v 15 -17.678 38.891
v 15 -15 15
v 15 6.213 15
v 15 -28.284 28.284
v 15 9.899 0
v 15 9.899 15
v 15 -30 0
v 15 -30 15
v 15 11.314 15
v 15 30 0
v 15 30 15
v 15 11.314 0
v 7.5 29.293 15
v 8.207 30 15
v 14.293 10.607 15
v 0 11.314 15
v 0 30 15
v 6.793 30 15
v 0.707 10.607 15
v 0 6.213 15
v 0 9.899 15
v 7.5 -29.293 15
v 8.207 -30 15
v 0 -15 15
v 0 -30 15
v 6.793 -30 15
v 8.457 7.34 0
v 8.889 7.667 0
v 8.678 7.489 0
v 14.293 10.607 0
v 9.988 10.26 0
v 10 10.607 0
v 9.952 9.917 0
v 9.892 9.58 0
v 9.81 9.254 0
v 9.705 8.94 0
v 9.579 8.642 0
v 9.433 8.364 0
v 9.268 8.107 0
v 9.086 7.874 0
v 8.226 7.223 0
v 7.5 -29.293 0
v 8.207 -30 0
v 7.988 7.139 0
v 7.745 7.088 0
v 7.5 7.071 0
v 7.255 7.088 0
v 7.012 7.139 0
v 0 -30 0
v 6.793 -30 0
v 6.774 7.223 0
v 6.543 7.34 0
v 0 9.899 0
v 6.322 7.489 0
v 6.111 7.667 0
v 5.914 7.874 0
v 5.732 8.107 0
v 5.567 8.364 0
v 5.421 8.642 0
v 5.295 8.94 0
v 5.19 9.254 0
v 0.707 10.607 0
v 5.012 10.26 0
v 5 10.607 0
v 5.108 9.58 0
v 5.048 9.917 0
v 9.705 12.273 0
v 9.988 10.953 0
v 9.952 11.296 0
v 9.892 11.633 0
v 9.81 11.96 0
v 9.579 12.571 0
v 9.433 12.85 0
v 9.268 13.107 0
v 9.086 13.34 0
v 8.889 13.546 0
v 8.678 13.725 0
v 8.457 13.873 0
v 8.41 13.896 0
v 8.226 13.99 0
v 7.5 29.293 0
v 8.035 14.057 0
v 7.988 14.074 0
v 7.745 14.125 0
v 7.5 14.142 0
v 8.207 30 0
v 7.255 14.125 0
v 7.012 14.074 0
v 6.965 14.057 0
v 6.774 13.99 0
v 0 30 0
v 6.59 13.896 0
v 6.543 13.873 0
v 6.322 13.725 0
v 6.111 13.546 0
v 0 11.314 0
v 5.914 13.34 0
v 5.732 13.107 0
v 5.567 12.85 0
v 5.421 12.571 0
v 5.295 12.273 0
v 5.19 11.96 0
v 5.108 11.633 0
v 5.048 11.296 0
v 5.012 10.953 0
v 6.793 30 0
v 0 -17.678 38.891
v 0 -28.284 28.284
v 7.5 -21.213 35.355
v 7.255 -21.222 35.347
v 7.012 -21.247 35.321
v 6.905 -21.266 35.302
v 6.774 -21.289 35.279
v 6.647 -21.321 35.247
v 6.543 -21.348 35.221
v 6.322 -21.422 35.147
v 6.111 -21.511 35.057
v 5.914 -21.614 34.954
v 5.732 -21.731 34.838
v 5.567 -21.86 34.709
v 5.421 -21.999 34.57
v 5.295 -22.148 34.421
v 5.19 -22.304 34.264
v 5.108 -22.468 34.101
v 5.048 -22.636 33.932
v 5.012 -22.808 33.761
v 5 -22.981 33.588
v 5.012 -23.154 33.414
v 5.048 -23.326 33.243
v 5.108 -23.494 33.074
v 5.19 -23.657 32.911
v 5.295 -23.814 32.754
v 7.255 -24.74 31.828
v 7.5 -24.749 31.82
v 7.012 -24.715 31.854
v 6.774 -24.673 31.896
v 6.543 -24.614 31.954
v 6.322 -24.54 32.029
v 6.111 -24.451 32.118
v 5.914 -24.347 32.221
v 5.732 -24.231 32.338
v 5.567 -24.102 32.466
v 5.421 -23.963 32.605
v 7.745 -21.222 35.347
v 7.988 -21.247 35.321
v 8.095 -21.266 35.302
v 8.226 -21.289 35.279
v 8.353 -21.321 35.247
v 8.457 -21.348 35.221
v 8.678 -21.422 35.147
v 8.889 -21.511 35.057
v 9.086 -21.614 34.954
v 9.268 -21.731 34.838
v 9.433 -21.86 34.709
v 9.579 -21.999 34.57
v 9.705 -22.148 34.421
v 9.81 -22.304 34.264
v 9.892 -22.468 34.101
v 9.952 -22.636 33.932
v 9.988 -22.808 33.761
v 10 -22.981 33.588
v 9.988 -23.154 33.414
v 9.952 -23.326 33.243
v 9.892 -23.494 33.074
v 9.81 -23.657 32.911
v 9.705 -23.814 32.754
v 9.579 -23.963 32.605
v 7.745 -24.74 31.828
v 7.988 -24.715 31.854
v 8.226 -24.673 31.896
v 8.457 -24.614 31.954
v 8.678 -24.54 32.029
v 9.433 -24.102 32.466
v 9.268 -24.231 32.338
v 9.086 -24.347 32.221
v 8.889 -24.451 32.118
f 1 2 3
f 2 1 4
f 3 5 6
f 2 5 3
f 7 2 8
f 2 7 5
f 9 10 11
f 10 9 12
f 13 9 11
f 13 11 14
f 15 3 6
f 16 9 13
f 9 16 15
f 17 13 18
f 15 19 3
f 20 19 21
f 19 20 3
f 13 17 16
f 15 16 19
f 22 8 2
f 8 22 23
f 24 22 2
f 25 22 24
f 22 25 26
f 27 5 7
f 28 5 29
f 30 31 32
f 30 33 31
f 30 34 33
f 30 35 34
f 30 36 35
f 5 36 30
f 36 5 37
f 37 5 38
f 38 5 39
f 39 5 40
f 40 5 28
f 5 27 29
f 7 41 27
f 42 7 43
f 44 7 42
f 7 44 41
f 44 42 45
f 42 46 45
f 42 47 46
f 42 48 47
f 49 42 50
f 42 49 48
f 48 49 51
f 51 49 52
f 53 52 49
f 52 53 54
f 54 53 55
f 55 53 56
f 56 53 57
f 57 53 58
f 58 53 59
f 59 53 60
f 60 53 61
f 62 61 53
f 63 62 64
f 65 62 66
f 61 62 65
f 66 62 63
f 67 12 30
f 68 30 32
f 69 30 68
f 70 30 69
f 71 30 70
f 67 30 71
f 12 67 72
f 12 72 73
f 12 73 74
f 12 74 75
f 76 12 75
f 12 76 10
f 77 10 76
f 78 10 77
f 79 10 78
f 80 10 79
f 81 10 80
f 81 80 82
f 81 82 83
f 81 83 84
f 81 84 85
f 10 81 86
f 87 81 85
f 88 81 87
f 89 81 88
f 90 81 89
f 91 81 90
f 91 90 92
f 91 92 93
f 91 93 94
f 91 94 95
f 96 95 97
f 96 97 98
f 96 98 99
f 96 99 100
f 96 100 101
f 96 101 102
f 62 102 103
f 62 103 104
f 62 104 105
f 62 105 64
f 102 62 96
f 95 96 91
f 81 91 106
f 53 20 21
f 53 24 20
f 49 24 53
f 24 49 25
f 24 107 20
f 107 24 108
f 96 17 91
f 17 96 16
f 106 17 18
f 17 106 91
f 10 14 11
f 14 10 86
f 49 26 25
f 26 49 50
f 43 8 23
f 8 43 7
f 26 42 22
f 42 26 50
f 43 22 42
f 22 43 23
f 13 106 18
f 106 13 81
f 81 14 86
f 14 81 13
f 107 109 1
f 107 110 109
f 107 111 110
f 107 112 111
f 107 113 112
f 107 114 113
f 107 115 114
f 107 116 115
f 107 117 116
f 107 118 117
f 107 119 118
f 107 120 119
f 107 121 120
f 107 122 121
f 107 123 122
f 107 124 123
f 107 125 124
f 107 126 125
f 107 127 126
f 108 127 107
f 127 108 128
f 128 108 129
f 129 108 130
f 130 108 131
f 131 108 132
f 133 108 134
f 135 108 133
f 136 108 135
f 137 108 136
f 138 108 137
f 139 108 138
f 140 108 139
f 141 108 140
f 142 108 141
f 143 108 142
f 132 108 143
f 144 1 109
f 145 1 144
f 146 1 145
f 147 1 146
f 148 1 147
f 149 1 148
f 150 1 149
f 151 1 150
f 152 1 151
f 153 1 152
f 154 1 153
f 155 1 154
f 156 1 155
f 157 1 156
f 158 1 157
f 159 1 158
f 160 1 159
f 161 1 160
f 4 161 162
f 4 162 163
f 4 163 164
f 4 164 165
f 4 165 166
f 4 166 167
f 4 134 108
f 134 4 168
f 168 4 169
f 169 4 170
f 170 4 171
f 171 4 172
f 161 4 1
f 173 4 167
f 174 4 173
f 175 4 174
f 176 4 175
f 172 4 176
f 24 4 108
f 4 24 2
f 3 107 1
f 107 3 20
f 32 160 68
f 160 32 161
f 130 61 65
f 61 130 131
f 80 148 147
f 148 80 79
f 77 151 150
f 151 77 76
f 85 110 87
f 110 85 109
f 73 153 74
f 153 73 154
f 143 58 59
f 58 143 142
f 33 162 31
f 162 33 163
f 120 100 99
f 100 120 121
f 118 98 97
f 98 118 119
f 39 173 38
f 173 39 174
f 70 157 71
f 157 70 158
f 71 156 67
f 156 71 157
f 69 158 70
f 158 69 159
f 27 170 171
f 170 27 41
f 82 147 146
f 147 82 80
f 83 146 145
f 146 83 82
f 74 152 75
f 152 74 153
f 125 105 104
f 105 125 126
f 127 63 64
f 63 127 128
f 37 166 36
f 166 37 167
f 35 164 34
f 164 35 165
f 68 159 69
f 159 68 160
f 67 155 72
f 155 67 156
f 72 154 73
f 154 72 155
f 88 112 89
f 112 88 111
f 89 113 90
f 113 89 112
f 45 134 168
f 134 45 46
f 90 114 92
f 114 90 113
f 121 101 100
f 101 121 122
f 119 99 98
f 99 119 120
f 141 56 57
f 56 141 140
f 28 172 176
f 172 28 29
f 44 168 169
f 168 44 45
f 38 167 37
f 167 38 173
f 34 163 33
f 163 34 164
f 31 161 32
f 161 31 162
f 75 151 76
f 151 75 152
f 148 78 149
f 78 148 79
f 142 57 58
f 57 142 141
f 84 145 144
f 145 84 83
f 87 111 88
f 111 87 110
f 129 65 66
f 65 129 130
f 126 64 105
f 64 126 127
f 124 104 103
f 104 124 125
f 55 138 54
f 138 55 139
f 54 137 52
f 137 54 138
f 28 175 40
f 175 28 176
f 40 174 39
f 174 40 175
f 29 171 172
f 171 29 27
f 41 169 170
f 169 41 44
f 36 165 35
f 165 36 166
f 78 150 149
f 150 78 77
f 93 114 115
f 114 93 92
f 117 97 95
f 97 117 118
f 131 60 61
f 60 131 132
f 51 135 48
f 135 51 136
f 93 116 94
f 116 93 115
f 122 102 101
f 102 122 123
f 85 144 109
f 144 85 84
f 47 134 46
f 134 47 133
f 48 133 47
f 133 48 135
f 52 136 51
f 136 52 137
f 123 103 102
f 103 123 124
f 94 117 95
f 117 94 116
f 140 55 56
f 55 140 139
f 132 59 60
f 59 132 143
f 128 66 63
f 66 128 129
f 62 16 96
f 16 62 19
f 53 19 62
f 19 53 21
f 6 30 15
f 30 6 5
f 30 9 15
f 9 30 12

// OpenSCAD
// [FL_INDEX: keywords="openscad, 3d_parametric, Drill_bit_holder, csg_solid" | COT="Parametric OpenSCAD design from 3DCodeverse"]
// Title: Drill bit holder

bit_angle = 45; // [10:90]
bit_diameter = 5; // [1.0:14.0]
module holder(diameter, angle){
	$fn=64;
	module notch(){
		rotate([0,0,45])
		translate([-.5,-.5,-200])
		cube([1,1,500]);
	}
	difference(){
		difference(){
			union(){
				difference(){
					translate([0,-30,0])
					cube([15,60,15]);
					translate([7.5,-30,0])
					notch();
					translate([7.5,30,0])
					notch();	
				}
				rotate([90-angle,0,0])
				cube([15,15,40]);
			}
			rotate([90-angle,0,0])
			translate([7.5,7.5,-50])
			cylinder(h=200,r=diameter/2);
		}
		translate([0,7.5/cos(90-angle),0])
		notch();
		translate([15,7.5/cos(90-angle),0])
		notch();
	}
}
holder(bit_diameter,bit_angle);
